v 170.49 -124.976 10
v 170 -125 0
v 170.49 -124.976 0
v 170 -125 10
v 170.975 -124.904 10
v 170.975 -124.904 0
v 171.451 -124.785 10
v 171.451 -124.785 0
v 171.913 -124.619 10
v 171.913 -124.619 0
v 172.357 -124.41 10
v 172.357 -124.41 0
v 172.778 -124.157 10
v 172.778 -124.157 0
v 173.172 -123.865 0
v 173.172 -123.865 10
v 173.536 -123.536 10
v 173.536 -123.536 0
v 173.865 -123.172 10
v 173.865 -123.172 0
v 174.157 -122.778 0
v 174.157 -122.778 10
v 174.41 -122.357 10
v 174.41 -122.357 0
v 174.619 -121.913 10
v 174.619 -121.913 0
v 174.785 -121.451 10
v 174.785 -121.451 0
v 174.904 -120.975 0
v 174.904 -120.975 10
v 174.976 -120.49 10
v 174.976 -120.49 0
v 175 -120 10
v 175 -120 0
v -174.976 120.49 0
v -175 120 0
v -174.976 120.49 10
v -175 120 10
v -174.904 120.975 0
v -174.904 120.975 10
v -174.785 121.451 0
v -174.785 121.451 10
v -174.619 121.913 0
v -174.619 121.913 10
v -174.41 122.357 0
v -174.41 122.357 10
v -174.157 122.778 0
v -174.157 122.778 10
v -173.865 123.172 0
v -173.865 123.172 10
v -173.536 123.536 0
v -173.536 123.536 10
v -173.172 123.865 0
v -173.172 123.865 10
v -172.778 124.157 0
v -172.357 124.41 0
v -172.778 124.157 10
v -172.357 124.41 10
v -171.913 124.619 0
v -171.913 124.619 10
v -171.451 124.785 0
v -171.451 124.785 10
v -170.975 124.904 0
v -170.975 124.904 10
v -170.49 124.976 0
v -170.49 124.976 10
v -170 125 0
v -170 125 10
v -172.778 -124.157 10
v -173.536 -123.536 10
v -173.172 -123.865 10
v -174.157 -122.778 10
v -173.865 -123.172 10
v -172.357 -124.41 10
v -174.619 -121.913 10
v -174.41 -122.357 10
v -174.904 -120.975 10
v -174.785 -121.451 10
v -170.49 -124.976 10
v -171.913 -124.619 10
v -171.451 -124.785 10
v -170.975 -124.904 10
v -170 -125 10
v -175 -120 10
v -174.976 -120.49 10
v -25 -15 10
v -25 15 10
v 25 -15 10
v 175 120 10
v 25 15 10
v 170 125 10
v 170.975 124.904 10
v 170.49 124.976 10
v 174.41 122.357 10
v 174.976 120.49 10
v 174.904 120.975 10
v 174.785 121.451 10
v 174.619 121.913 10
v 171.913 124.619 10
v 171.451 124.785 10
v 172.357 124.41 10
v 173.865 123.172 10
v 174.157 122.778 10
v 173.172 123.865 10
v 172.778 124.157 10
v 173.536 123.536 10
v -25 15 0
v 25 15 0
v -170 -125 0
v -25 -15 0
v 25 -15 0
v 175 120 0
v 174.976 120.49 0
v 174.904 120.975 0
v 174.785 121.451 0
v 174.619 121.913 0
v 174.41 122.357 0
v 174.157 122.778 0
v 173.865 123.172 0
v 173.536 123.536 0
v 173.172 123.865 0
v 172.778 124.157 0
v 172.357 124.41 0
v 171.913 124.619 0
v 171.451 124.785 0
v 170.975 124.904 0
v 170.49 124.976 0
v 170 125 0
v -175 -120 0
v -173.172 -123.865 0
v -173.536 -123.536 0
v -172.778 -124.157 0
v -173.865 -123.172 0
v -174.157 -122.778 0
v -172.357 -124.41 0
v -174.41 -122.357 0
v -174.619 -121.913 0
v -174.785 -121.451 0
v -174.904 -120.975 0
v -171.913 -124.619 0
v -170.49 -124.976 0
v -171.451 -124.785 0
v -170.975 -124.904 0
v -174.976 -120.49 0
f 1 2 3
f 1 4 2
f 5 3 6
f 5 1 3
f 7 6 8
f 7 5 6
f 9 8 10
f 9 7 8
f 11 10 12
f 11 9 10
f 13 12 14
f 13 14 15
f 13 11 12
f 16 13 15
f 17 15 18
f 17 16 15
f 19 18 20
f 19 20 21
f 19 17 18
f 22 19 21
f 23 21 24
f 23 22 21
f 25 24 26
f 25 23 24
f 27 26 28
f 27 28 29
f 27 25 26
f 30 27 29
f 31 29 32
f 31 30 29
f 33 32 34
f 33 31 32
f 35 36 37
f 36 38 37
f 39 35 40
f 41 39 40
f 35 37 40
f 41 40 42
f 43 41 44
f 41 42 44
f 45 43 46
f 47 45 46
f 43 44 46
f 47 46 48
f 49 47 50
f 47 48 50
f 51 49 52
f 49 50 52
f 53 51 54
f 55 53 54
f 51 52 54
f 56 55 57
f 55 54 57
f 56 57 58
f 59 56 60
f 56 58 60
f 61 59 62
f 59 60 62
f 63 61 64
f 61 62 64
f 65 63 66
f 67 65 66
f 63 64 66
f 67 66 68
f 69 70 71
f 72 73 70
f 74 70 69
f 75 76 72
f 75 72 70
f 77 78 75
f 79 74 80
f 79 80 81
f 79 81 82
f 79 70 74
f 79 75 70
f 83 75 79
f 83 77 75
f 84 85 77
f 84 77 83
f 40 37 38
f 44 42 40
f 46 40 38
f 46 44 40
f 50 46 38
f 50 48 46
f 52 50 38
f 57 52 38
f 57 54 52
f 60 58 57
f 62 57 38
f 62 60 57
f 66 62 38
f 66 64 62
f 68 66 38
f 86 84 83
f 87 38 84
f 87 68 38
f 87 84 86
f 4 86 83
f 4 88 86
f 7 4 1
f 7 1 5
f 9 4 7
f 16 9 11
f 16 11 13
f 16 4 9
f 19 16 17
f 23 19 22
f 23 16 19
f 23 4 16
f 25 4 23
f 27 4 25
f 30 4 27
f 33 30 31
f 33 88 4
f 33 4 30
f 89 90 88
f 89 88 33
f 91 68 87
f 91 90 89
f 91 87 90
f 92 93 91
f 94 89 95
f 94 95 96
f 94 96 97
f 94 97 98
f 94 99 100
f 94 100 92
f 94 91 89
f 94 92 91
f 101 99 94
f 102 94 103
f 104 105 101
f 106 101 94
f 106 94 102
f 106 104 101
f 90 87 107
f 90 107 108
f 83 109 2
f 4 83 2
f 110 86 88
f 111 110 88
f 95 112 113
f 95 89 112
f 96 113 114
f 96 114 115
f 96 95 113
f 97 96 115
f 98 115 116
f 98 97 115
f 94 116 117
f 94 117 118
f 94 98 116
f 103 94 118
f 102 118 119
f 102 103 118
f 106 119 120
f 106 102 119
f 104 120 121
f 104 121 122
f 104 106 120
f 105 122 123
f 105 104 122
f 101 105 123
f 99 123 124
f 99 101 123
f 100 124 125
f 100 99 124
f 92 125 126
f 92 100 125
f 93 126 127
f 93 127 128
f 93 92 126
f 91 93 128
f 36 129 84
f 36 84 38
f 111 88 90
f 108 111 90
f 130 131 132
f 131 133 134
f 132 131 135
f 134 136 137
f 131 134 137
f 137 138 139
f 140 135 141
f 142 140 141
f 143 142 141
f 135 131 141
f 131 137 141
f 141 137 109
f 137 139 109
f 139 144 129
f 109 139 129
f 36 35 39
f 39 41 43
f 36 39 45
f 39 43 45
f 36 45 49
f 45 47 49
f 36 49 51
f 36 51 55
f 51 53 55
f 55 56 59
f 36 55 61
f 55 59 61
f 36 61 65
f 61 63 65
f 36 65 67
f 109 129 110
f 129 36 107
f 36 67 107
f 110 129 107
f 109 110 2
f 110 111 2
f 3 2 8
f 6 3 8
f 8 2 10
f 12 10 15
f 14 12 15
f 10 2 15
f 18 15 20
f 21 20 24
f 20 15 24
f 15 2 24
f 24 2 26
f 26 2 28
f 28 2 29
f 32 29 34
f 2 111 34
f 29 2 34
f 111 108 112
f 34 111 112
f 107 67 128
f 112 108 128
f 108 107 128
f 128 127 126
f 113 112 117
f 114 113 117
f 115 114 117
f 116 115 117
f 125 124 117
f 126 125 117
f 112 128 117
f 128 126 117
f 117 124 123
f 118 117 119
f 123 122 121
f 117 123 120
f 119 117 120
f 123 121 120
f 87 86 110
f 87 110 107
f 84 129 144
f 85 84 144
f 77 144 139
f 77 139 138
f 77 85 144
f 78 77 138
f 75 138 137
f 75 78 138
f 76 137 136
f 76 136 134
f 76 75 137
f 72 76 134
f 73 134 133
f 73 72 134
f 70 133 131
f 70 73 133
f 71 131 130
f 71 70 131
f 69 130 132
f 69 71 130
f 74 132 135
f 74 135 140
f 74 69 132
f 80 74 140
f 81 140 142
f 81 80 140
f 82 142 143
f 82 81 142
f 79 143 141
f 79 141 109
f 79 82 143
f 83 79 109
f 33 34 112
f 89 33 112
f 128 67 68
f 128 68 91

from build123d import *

# Parameters (mm, degrees)
SKIZZE1_W                       = 350
SKIZZE1_H                       = 250
AUFSATZ_LINEAR_AUSTRAGEN1_DEPTH = 10
VERRUNDUNG1_R                   = 5
SKIZZE3_W                       = 50
SKIZZE3_H                       = 30
SCHNITT_LINEAR_AUSTRAGEN1_DEPTH = 216.290501416


with BuildPart() as part:
    # Skizze1 → Aufsatz-Linear austragen1 (new body)
    with BuildSketch(Plane.XY):
        Rectangle(SKIZZE1_W, SKIZZE1_H)
    extrude(amount=AUFSATZ_LINEAR_AUSTRAGEN1_DEPTH)

    # Verrundung1
    verrundung1_edges = [part.edges().sort_by_distance(p)[0] for p in [
        (-175, 125, 5),
        (175, 125, 5),
        (175, -125, 5),
        (-175, -125, 5),
    ]]
    fillet(verrundung1_edges, radius=VERRUNDUNG1_R)

    # Skizze3 → Schnitt-Linear austragen1 (cut, through all)
    with BuildSketch(Plane.XY.offset(10)):
        Rectangle(SKIZZE3_W, SKIZZE3_H)
    extrude(amount=-SCHNITT_LINEAR_AUSTRAGEN1_DEPTH, mode=Mode.SUBTRACT)


solid = part.part
